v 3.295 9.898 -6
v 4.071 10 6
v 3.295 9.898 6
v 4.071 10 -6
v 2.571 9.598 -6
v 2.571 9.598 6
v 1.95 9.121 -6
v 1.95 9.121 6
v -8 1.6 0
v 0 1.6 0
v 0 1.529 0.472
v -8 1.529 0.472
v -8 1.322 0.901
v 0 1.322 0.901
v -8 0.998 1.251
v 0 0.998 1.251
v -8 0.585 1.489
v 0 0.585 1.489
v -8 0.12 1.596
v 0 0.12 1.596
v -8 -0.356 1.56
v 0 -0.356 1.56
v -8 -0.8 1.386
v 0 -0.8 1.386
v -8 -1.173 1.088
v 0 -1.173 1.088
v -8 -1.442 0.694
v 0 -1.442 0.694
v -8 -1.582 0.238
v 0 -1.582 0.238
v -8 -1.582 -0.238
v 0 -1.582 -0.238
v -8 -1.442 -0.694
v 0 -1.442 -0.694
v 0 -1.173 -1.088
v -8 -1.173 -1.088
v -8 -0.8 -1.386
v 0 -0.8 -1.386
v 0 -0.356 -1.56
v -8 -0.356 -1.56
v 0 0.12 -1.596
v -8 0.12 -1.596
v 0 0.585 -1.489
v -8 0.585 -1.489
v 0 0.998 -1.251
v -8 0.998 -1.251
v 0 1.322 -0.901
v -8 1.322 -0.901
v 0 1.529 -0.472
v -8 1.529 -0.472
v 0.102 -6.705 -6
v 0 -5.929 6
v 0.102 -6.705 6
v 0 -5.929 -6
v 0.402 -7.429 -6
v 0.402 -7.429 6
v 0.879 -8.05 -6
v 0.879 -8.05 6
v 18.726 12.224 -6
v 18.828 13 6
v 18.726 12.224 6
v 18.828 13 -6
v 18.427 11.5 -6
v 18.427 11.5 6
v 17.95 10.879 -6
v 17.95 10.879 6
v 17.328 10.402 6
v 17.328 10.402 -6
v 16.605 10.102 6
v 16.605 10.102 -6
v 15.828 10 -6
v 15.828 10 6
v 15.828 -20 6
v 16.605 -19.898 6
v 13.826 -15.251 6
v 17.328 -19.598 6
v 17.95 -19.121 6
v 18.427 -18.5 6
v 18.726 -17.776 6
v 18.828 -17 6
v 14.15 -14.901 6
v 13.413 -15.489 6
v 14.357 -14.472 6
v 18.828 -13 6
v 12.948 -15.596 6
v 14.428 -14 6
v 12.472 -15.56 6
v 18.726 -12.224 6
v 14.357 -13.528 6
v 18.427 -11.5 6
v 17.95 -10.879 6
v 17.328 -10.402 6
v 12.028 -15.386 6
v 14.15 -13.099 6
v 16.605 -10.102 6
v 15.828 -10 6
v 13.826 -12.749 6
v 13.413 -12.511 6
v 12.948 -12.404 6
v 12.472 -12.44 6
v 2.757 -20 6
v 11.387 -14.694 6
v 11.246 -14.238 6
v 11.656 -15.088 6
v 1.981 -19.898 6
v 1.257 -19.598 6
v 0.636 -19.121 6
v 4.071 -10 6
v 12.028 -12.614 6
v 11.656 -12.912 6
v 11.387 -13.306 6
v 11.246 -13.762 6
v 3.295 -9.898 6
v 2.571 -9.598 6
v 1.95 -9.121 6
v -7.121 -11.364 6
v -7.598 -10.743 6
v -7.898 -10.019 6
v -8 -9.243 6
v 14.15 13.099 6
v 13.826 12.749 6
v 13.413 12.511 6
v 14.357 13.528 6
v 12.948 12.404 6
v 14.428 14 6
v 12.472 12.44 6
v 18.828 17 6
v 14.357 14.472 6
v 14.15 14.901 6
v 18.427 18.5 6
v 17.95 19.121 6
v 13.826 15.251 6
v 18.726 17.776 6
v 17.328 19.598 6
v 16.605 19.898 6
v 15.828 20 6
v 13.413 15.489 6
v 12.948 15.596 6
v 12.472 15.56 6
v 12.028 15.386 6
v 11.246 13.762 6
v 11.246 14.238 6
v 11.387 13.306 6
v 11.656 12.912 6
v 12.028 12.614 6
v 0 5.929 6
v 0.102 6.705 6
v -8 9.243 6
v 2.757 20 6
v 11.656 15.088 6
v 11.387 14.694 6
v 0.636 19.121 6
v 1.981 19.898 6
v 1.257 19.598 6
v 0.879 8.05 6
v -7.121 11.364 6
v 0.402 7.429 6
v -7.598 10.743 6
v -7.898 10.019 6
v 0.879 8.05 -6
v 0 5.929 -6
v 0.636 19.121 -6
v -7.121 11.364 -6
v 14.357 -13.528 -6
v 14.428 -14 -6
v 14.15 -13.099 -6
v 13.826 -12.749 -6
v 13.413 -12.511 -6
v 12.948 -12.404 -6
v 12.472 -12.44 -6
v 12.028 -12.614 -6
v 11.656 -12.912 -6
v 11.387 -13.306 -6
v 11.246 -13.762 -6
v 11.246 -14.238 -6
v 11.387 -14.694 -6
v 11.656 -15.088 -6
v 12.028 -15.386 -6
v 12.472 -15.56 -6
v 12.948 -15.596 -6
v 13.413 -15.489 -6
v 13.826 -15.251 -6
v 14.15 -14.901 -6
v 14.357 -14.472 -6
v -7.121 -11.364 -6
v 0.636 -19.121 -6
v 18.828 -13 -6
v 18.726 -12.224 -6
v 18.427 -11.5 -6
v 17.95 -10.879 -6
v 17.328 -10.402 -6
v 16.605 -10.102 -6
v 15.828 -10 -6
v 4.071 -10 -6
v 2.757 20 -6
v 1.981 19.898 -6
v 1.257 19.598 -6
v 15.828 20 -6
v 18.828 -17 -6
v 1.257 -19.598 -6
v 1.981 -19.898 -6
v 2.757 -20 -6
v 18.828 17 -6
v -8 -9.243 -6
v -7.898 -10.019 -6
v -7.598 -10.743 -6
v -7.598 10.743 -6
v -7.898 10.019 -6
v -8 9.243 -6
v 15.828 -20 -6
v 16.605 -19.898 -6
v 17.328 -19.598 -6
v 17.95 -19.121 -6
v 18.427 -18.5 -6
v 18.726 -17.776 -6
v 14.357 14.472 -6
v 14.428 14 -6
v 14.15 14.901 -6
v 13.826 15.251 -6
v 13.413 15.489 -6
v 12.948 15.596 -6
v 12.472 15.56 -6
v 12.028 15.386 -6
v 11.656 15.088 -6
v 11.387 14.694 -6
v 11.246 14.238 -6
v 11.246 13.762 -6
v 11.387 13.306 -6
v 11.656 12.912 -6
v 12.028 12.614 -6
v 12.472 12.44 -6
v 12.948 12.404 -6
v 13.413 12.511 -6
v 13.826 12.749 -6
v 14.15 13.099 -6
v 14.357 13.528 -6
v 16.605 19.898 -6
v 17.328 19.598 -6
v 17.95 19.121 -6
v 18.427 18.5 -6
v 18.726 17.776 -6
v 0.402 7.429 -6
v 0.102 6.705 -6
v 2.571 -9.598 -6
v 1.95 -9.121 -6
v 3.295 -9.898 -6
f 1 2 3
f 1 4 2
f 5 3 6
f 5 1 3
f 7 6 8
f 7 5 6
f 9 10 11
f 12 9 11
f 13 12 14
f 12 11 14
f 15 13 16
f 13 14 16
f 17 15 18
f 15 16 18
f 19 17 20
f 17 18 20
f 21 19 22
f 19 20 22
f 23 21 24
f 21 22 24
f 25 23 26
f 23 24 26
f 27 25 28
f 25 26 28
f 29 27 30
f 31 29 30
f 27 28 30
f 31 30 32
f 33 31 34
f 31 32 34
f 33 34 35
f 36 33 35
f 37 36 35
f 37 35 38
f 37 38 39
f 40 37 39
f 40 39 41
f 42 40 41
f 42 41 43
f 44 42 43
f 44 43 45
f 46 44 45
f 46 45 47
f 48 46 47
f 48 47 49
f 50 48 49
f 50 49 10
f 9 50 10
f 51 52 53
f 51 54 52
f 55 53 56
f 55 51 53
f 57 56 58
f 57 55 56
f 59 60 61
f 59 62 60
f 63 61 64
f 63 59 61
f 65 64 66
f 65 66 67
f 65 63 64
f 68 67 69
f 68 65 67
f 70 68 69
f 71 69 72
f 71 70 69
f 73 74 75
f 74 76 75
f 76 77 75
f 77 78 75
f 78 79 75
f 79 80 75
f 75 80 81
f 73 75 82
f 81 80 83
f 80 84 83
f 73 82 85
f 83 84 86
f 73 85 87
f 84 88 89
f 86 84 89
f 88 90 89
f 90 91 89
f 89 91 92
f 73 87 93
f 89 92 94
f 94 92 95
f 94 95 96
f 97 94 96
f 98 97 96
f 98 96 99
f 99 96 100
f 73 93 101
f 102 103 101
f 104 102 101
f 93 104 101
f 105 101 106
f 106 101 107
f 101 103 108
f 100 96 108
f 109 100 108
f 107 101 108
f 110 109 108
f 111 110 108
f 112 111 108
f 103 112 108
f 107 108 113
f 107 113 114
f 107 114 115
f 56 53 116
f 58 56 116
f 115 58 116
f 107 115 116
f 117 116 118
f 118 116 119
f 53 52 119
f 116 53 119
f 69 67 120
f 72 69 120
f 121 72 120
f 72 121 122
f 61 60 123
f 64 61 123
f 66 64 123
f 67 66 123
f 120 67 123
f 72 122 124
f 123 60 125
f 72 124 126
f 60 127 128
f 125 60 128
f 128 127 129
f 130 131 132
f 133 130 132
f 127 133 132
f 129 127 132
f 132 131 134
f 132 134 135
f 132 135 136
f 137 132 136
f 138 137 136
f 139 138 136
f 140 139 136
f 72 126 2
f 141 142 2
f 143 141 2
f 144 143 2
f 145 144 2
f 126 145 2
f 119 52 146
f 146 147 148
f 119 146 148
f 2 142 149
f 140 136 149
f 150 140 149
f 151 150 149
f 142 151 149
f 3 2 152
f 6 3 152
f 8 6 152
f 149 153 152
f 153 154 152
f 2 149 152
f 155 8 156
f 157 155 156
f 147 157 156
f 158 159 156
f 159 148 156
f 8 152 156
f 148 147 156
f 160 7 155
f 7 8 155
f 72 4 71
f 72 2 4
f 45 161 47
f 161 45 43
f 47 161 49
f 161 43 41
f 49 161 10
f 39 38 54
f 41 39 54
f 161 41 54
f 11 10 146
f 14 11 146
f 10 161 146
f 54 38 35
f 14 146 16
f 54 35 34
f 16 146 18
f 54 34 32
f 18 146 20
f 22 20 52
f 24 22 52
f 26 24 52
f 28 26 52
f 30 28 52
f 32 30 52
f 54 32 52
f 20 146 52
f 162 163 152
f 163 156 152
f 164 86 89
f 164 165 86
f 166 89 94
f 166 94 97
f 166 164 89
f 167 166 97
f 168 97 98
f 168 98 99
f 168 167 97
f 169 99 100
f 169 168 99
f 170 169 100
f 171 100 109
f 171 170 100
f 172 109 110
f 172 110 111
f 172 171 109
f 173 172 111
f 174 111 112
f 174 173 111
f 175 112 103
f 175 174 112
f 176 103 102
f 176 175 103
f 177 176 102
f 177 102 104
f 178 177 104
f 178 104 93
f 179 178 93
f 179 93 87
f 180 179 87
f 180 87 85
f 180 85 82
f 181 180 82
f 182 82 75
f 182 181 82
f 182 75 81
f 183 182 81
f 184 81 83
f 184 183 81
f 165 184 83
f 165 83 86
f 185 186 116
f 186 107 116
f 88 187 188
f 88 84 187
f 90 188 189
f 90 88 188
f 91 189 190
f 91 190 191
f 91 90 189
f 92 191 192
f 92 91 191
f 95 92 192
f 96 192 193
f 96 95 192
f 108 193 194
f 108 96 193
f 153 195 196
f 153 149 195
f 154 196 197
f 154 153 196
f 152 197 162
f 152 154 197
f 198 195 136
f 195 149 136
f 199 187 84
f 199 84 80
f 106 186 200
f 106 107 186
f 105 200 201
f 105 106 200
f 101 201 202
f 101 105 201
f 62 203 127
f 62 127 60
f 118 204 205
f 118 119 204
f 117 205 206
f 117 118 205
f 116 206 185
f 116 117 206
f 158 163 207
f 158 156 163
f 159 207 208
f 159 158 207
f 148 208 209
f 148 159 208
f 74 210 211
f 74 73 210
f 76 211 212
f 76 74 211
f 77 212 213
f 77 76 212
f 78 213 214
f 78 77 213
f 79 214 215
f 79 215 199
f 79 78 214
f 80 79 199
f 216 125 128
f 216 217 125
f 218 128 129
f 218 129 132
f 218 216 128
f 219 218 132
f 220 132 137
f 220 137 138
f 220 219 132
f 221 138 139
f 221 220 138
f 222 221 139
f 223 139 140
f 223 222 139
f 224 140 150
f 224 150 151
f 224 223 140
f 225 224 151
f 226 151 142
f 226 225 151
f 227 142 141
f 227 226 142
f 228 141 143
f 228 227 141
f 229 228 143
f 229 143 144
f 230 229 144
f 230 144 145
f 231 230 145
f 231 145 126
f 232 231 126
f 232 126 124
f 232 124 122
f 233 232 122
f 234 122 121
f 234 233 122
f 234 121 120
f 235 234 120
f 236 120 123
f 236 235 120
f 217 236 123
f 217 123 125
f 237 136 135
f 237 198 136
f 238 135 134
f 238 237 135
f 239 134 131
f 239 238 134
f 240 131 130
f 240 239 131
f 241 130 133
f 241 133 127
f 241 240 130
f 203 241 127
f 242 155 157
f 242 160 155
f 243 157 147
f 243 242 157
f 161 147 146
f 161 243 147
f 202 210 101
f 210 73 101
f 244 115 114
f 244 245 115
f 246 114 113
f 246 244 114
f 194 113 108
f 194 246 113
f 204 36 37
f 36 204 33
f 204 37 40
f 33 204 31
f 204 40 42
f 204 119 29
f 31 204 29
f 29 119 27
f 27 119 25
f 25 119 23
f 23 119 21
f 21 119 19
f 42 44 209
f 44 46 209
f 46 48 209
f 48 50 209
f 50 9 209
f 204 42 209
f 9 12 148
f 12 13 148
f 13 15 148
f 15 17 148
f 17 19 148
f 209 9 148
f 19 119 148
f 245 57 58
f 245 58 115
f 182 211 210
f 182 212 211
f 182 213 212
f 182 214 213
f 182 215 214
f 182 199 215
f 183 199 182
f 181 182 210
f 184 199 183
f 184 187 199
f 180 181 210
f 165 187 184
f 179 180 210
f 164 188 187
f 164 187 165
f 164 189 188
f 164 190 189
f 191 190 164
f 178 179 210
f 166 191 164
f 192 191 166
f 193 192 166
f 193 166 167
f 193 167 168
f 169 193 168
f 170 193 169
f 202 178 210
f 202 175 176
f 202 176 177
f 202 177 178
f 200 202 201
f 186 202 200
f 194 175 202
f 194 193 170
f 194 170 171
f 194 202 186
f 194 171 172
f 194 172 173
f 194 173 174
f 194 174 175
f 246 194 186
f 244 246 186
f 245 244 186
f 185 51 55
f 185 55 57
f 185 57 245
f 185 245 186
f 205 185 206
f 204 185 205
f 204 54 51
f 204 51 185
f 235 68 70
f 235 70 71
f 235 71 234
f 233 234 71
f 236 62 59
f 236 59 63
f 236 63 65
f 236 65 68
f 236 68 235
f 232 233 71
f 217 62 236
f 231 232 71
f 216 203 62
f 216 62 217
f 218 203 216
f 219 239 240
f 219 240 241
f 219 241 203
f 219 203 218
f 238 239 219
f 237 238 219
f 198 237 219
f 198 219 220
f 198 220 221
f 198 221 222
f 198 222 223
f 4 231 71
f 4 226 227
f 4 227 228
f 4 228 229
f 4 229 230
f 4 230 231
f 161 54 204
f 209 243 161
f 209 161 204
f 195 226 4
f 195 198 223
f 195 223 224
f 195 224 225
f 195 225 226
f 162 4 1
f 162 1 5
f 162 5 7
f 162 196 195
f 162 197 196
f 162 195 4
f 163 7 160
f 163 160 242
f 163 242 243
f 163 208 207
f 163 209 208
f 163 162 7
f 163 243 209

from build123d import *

# Parameters (mm, degrees)
SKETCH_R     = 1.6
PAD_DEPTH    = 6
SKETCH001_R  = 1.6
POCKET_DEPTH = 8.001
FILLET_R     = 3


with BuildPart() as part:
    # Sketch → Pad (new body, symmetric)
    with BuildSketch(Plane.XY):
        Polygon((1.514719, 20), (18.828427, 20), (18.828427, 10), (6.828427, 10), (2.828427, 10), (0, 7.171573), (0, -7.171573), (2.828427, -10), (6.828427, -10), (18.828427, -10), (18.828427, -20), (1.514719, -20), (-8, -10.485281), (-8, 10.485281), align=None)
        with Locations((12.828427, 14)):
            Circle(SKETCH_R, mode=Mode.SUBTRACT)
        with Locations((12.828427, -14)):
            Circle(SKETCH_R, mode=Mode.SUBTRACT)
    extrude(amount=PAD_DEPTH, both=True)

    # Sketch001 → Pocket (cut, through all)
    with BuildSketch(Plane.YZ):
        Circle(SKETCH001_R)
    extrude(amount=-POCKET_DEPTH, mode=Mode.SUBTRACT)

    # Fillet
    fillet_edges = [part.edges().sort_by_distance(p)[0] for p in [
        (18.828427, -20, 0),
        (18.828427, -10, 0),
        (18.828427, 10, 0),
        (18.828427, 20, 0),
        (1.514719, -20, 0),
        (-8, -10.485281, 0),
        (-8, 10.485281, 0),
        (1.514719, 20, 0),
        (2.828427, 10, 0),
        (0, 7.171573, 0),
        (0, -7.171573, 0),
        (2.828427, -10, 0),
    ]]
    fillet(fillet_edges, radius=FILLET_R)


solid = part.part
